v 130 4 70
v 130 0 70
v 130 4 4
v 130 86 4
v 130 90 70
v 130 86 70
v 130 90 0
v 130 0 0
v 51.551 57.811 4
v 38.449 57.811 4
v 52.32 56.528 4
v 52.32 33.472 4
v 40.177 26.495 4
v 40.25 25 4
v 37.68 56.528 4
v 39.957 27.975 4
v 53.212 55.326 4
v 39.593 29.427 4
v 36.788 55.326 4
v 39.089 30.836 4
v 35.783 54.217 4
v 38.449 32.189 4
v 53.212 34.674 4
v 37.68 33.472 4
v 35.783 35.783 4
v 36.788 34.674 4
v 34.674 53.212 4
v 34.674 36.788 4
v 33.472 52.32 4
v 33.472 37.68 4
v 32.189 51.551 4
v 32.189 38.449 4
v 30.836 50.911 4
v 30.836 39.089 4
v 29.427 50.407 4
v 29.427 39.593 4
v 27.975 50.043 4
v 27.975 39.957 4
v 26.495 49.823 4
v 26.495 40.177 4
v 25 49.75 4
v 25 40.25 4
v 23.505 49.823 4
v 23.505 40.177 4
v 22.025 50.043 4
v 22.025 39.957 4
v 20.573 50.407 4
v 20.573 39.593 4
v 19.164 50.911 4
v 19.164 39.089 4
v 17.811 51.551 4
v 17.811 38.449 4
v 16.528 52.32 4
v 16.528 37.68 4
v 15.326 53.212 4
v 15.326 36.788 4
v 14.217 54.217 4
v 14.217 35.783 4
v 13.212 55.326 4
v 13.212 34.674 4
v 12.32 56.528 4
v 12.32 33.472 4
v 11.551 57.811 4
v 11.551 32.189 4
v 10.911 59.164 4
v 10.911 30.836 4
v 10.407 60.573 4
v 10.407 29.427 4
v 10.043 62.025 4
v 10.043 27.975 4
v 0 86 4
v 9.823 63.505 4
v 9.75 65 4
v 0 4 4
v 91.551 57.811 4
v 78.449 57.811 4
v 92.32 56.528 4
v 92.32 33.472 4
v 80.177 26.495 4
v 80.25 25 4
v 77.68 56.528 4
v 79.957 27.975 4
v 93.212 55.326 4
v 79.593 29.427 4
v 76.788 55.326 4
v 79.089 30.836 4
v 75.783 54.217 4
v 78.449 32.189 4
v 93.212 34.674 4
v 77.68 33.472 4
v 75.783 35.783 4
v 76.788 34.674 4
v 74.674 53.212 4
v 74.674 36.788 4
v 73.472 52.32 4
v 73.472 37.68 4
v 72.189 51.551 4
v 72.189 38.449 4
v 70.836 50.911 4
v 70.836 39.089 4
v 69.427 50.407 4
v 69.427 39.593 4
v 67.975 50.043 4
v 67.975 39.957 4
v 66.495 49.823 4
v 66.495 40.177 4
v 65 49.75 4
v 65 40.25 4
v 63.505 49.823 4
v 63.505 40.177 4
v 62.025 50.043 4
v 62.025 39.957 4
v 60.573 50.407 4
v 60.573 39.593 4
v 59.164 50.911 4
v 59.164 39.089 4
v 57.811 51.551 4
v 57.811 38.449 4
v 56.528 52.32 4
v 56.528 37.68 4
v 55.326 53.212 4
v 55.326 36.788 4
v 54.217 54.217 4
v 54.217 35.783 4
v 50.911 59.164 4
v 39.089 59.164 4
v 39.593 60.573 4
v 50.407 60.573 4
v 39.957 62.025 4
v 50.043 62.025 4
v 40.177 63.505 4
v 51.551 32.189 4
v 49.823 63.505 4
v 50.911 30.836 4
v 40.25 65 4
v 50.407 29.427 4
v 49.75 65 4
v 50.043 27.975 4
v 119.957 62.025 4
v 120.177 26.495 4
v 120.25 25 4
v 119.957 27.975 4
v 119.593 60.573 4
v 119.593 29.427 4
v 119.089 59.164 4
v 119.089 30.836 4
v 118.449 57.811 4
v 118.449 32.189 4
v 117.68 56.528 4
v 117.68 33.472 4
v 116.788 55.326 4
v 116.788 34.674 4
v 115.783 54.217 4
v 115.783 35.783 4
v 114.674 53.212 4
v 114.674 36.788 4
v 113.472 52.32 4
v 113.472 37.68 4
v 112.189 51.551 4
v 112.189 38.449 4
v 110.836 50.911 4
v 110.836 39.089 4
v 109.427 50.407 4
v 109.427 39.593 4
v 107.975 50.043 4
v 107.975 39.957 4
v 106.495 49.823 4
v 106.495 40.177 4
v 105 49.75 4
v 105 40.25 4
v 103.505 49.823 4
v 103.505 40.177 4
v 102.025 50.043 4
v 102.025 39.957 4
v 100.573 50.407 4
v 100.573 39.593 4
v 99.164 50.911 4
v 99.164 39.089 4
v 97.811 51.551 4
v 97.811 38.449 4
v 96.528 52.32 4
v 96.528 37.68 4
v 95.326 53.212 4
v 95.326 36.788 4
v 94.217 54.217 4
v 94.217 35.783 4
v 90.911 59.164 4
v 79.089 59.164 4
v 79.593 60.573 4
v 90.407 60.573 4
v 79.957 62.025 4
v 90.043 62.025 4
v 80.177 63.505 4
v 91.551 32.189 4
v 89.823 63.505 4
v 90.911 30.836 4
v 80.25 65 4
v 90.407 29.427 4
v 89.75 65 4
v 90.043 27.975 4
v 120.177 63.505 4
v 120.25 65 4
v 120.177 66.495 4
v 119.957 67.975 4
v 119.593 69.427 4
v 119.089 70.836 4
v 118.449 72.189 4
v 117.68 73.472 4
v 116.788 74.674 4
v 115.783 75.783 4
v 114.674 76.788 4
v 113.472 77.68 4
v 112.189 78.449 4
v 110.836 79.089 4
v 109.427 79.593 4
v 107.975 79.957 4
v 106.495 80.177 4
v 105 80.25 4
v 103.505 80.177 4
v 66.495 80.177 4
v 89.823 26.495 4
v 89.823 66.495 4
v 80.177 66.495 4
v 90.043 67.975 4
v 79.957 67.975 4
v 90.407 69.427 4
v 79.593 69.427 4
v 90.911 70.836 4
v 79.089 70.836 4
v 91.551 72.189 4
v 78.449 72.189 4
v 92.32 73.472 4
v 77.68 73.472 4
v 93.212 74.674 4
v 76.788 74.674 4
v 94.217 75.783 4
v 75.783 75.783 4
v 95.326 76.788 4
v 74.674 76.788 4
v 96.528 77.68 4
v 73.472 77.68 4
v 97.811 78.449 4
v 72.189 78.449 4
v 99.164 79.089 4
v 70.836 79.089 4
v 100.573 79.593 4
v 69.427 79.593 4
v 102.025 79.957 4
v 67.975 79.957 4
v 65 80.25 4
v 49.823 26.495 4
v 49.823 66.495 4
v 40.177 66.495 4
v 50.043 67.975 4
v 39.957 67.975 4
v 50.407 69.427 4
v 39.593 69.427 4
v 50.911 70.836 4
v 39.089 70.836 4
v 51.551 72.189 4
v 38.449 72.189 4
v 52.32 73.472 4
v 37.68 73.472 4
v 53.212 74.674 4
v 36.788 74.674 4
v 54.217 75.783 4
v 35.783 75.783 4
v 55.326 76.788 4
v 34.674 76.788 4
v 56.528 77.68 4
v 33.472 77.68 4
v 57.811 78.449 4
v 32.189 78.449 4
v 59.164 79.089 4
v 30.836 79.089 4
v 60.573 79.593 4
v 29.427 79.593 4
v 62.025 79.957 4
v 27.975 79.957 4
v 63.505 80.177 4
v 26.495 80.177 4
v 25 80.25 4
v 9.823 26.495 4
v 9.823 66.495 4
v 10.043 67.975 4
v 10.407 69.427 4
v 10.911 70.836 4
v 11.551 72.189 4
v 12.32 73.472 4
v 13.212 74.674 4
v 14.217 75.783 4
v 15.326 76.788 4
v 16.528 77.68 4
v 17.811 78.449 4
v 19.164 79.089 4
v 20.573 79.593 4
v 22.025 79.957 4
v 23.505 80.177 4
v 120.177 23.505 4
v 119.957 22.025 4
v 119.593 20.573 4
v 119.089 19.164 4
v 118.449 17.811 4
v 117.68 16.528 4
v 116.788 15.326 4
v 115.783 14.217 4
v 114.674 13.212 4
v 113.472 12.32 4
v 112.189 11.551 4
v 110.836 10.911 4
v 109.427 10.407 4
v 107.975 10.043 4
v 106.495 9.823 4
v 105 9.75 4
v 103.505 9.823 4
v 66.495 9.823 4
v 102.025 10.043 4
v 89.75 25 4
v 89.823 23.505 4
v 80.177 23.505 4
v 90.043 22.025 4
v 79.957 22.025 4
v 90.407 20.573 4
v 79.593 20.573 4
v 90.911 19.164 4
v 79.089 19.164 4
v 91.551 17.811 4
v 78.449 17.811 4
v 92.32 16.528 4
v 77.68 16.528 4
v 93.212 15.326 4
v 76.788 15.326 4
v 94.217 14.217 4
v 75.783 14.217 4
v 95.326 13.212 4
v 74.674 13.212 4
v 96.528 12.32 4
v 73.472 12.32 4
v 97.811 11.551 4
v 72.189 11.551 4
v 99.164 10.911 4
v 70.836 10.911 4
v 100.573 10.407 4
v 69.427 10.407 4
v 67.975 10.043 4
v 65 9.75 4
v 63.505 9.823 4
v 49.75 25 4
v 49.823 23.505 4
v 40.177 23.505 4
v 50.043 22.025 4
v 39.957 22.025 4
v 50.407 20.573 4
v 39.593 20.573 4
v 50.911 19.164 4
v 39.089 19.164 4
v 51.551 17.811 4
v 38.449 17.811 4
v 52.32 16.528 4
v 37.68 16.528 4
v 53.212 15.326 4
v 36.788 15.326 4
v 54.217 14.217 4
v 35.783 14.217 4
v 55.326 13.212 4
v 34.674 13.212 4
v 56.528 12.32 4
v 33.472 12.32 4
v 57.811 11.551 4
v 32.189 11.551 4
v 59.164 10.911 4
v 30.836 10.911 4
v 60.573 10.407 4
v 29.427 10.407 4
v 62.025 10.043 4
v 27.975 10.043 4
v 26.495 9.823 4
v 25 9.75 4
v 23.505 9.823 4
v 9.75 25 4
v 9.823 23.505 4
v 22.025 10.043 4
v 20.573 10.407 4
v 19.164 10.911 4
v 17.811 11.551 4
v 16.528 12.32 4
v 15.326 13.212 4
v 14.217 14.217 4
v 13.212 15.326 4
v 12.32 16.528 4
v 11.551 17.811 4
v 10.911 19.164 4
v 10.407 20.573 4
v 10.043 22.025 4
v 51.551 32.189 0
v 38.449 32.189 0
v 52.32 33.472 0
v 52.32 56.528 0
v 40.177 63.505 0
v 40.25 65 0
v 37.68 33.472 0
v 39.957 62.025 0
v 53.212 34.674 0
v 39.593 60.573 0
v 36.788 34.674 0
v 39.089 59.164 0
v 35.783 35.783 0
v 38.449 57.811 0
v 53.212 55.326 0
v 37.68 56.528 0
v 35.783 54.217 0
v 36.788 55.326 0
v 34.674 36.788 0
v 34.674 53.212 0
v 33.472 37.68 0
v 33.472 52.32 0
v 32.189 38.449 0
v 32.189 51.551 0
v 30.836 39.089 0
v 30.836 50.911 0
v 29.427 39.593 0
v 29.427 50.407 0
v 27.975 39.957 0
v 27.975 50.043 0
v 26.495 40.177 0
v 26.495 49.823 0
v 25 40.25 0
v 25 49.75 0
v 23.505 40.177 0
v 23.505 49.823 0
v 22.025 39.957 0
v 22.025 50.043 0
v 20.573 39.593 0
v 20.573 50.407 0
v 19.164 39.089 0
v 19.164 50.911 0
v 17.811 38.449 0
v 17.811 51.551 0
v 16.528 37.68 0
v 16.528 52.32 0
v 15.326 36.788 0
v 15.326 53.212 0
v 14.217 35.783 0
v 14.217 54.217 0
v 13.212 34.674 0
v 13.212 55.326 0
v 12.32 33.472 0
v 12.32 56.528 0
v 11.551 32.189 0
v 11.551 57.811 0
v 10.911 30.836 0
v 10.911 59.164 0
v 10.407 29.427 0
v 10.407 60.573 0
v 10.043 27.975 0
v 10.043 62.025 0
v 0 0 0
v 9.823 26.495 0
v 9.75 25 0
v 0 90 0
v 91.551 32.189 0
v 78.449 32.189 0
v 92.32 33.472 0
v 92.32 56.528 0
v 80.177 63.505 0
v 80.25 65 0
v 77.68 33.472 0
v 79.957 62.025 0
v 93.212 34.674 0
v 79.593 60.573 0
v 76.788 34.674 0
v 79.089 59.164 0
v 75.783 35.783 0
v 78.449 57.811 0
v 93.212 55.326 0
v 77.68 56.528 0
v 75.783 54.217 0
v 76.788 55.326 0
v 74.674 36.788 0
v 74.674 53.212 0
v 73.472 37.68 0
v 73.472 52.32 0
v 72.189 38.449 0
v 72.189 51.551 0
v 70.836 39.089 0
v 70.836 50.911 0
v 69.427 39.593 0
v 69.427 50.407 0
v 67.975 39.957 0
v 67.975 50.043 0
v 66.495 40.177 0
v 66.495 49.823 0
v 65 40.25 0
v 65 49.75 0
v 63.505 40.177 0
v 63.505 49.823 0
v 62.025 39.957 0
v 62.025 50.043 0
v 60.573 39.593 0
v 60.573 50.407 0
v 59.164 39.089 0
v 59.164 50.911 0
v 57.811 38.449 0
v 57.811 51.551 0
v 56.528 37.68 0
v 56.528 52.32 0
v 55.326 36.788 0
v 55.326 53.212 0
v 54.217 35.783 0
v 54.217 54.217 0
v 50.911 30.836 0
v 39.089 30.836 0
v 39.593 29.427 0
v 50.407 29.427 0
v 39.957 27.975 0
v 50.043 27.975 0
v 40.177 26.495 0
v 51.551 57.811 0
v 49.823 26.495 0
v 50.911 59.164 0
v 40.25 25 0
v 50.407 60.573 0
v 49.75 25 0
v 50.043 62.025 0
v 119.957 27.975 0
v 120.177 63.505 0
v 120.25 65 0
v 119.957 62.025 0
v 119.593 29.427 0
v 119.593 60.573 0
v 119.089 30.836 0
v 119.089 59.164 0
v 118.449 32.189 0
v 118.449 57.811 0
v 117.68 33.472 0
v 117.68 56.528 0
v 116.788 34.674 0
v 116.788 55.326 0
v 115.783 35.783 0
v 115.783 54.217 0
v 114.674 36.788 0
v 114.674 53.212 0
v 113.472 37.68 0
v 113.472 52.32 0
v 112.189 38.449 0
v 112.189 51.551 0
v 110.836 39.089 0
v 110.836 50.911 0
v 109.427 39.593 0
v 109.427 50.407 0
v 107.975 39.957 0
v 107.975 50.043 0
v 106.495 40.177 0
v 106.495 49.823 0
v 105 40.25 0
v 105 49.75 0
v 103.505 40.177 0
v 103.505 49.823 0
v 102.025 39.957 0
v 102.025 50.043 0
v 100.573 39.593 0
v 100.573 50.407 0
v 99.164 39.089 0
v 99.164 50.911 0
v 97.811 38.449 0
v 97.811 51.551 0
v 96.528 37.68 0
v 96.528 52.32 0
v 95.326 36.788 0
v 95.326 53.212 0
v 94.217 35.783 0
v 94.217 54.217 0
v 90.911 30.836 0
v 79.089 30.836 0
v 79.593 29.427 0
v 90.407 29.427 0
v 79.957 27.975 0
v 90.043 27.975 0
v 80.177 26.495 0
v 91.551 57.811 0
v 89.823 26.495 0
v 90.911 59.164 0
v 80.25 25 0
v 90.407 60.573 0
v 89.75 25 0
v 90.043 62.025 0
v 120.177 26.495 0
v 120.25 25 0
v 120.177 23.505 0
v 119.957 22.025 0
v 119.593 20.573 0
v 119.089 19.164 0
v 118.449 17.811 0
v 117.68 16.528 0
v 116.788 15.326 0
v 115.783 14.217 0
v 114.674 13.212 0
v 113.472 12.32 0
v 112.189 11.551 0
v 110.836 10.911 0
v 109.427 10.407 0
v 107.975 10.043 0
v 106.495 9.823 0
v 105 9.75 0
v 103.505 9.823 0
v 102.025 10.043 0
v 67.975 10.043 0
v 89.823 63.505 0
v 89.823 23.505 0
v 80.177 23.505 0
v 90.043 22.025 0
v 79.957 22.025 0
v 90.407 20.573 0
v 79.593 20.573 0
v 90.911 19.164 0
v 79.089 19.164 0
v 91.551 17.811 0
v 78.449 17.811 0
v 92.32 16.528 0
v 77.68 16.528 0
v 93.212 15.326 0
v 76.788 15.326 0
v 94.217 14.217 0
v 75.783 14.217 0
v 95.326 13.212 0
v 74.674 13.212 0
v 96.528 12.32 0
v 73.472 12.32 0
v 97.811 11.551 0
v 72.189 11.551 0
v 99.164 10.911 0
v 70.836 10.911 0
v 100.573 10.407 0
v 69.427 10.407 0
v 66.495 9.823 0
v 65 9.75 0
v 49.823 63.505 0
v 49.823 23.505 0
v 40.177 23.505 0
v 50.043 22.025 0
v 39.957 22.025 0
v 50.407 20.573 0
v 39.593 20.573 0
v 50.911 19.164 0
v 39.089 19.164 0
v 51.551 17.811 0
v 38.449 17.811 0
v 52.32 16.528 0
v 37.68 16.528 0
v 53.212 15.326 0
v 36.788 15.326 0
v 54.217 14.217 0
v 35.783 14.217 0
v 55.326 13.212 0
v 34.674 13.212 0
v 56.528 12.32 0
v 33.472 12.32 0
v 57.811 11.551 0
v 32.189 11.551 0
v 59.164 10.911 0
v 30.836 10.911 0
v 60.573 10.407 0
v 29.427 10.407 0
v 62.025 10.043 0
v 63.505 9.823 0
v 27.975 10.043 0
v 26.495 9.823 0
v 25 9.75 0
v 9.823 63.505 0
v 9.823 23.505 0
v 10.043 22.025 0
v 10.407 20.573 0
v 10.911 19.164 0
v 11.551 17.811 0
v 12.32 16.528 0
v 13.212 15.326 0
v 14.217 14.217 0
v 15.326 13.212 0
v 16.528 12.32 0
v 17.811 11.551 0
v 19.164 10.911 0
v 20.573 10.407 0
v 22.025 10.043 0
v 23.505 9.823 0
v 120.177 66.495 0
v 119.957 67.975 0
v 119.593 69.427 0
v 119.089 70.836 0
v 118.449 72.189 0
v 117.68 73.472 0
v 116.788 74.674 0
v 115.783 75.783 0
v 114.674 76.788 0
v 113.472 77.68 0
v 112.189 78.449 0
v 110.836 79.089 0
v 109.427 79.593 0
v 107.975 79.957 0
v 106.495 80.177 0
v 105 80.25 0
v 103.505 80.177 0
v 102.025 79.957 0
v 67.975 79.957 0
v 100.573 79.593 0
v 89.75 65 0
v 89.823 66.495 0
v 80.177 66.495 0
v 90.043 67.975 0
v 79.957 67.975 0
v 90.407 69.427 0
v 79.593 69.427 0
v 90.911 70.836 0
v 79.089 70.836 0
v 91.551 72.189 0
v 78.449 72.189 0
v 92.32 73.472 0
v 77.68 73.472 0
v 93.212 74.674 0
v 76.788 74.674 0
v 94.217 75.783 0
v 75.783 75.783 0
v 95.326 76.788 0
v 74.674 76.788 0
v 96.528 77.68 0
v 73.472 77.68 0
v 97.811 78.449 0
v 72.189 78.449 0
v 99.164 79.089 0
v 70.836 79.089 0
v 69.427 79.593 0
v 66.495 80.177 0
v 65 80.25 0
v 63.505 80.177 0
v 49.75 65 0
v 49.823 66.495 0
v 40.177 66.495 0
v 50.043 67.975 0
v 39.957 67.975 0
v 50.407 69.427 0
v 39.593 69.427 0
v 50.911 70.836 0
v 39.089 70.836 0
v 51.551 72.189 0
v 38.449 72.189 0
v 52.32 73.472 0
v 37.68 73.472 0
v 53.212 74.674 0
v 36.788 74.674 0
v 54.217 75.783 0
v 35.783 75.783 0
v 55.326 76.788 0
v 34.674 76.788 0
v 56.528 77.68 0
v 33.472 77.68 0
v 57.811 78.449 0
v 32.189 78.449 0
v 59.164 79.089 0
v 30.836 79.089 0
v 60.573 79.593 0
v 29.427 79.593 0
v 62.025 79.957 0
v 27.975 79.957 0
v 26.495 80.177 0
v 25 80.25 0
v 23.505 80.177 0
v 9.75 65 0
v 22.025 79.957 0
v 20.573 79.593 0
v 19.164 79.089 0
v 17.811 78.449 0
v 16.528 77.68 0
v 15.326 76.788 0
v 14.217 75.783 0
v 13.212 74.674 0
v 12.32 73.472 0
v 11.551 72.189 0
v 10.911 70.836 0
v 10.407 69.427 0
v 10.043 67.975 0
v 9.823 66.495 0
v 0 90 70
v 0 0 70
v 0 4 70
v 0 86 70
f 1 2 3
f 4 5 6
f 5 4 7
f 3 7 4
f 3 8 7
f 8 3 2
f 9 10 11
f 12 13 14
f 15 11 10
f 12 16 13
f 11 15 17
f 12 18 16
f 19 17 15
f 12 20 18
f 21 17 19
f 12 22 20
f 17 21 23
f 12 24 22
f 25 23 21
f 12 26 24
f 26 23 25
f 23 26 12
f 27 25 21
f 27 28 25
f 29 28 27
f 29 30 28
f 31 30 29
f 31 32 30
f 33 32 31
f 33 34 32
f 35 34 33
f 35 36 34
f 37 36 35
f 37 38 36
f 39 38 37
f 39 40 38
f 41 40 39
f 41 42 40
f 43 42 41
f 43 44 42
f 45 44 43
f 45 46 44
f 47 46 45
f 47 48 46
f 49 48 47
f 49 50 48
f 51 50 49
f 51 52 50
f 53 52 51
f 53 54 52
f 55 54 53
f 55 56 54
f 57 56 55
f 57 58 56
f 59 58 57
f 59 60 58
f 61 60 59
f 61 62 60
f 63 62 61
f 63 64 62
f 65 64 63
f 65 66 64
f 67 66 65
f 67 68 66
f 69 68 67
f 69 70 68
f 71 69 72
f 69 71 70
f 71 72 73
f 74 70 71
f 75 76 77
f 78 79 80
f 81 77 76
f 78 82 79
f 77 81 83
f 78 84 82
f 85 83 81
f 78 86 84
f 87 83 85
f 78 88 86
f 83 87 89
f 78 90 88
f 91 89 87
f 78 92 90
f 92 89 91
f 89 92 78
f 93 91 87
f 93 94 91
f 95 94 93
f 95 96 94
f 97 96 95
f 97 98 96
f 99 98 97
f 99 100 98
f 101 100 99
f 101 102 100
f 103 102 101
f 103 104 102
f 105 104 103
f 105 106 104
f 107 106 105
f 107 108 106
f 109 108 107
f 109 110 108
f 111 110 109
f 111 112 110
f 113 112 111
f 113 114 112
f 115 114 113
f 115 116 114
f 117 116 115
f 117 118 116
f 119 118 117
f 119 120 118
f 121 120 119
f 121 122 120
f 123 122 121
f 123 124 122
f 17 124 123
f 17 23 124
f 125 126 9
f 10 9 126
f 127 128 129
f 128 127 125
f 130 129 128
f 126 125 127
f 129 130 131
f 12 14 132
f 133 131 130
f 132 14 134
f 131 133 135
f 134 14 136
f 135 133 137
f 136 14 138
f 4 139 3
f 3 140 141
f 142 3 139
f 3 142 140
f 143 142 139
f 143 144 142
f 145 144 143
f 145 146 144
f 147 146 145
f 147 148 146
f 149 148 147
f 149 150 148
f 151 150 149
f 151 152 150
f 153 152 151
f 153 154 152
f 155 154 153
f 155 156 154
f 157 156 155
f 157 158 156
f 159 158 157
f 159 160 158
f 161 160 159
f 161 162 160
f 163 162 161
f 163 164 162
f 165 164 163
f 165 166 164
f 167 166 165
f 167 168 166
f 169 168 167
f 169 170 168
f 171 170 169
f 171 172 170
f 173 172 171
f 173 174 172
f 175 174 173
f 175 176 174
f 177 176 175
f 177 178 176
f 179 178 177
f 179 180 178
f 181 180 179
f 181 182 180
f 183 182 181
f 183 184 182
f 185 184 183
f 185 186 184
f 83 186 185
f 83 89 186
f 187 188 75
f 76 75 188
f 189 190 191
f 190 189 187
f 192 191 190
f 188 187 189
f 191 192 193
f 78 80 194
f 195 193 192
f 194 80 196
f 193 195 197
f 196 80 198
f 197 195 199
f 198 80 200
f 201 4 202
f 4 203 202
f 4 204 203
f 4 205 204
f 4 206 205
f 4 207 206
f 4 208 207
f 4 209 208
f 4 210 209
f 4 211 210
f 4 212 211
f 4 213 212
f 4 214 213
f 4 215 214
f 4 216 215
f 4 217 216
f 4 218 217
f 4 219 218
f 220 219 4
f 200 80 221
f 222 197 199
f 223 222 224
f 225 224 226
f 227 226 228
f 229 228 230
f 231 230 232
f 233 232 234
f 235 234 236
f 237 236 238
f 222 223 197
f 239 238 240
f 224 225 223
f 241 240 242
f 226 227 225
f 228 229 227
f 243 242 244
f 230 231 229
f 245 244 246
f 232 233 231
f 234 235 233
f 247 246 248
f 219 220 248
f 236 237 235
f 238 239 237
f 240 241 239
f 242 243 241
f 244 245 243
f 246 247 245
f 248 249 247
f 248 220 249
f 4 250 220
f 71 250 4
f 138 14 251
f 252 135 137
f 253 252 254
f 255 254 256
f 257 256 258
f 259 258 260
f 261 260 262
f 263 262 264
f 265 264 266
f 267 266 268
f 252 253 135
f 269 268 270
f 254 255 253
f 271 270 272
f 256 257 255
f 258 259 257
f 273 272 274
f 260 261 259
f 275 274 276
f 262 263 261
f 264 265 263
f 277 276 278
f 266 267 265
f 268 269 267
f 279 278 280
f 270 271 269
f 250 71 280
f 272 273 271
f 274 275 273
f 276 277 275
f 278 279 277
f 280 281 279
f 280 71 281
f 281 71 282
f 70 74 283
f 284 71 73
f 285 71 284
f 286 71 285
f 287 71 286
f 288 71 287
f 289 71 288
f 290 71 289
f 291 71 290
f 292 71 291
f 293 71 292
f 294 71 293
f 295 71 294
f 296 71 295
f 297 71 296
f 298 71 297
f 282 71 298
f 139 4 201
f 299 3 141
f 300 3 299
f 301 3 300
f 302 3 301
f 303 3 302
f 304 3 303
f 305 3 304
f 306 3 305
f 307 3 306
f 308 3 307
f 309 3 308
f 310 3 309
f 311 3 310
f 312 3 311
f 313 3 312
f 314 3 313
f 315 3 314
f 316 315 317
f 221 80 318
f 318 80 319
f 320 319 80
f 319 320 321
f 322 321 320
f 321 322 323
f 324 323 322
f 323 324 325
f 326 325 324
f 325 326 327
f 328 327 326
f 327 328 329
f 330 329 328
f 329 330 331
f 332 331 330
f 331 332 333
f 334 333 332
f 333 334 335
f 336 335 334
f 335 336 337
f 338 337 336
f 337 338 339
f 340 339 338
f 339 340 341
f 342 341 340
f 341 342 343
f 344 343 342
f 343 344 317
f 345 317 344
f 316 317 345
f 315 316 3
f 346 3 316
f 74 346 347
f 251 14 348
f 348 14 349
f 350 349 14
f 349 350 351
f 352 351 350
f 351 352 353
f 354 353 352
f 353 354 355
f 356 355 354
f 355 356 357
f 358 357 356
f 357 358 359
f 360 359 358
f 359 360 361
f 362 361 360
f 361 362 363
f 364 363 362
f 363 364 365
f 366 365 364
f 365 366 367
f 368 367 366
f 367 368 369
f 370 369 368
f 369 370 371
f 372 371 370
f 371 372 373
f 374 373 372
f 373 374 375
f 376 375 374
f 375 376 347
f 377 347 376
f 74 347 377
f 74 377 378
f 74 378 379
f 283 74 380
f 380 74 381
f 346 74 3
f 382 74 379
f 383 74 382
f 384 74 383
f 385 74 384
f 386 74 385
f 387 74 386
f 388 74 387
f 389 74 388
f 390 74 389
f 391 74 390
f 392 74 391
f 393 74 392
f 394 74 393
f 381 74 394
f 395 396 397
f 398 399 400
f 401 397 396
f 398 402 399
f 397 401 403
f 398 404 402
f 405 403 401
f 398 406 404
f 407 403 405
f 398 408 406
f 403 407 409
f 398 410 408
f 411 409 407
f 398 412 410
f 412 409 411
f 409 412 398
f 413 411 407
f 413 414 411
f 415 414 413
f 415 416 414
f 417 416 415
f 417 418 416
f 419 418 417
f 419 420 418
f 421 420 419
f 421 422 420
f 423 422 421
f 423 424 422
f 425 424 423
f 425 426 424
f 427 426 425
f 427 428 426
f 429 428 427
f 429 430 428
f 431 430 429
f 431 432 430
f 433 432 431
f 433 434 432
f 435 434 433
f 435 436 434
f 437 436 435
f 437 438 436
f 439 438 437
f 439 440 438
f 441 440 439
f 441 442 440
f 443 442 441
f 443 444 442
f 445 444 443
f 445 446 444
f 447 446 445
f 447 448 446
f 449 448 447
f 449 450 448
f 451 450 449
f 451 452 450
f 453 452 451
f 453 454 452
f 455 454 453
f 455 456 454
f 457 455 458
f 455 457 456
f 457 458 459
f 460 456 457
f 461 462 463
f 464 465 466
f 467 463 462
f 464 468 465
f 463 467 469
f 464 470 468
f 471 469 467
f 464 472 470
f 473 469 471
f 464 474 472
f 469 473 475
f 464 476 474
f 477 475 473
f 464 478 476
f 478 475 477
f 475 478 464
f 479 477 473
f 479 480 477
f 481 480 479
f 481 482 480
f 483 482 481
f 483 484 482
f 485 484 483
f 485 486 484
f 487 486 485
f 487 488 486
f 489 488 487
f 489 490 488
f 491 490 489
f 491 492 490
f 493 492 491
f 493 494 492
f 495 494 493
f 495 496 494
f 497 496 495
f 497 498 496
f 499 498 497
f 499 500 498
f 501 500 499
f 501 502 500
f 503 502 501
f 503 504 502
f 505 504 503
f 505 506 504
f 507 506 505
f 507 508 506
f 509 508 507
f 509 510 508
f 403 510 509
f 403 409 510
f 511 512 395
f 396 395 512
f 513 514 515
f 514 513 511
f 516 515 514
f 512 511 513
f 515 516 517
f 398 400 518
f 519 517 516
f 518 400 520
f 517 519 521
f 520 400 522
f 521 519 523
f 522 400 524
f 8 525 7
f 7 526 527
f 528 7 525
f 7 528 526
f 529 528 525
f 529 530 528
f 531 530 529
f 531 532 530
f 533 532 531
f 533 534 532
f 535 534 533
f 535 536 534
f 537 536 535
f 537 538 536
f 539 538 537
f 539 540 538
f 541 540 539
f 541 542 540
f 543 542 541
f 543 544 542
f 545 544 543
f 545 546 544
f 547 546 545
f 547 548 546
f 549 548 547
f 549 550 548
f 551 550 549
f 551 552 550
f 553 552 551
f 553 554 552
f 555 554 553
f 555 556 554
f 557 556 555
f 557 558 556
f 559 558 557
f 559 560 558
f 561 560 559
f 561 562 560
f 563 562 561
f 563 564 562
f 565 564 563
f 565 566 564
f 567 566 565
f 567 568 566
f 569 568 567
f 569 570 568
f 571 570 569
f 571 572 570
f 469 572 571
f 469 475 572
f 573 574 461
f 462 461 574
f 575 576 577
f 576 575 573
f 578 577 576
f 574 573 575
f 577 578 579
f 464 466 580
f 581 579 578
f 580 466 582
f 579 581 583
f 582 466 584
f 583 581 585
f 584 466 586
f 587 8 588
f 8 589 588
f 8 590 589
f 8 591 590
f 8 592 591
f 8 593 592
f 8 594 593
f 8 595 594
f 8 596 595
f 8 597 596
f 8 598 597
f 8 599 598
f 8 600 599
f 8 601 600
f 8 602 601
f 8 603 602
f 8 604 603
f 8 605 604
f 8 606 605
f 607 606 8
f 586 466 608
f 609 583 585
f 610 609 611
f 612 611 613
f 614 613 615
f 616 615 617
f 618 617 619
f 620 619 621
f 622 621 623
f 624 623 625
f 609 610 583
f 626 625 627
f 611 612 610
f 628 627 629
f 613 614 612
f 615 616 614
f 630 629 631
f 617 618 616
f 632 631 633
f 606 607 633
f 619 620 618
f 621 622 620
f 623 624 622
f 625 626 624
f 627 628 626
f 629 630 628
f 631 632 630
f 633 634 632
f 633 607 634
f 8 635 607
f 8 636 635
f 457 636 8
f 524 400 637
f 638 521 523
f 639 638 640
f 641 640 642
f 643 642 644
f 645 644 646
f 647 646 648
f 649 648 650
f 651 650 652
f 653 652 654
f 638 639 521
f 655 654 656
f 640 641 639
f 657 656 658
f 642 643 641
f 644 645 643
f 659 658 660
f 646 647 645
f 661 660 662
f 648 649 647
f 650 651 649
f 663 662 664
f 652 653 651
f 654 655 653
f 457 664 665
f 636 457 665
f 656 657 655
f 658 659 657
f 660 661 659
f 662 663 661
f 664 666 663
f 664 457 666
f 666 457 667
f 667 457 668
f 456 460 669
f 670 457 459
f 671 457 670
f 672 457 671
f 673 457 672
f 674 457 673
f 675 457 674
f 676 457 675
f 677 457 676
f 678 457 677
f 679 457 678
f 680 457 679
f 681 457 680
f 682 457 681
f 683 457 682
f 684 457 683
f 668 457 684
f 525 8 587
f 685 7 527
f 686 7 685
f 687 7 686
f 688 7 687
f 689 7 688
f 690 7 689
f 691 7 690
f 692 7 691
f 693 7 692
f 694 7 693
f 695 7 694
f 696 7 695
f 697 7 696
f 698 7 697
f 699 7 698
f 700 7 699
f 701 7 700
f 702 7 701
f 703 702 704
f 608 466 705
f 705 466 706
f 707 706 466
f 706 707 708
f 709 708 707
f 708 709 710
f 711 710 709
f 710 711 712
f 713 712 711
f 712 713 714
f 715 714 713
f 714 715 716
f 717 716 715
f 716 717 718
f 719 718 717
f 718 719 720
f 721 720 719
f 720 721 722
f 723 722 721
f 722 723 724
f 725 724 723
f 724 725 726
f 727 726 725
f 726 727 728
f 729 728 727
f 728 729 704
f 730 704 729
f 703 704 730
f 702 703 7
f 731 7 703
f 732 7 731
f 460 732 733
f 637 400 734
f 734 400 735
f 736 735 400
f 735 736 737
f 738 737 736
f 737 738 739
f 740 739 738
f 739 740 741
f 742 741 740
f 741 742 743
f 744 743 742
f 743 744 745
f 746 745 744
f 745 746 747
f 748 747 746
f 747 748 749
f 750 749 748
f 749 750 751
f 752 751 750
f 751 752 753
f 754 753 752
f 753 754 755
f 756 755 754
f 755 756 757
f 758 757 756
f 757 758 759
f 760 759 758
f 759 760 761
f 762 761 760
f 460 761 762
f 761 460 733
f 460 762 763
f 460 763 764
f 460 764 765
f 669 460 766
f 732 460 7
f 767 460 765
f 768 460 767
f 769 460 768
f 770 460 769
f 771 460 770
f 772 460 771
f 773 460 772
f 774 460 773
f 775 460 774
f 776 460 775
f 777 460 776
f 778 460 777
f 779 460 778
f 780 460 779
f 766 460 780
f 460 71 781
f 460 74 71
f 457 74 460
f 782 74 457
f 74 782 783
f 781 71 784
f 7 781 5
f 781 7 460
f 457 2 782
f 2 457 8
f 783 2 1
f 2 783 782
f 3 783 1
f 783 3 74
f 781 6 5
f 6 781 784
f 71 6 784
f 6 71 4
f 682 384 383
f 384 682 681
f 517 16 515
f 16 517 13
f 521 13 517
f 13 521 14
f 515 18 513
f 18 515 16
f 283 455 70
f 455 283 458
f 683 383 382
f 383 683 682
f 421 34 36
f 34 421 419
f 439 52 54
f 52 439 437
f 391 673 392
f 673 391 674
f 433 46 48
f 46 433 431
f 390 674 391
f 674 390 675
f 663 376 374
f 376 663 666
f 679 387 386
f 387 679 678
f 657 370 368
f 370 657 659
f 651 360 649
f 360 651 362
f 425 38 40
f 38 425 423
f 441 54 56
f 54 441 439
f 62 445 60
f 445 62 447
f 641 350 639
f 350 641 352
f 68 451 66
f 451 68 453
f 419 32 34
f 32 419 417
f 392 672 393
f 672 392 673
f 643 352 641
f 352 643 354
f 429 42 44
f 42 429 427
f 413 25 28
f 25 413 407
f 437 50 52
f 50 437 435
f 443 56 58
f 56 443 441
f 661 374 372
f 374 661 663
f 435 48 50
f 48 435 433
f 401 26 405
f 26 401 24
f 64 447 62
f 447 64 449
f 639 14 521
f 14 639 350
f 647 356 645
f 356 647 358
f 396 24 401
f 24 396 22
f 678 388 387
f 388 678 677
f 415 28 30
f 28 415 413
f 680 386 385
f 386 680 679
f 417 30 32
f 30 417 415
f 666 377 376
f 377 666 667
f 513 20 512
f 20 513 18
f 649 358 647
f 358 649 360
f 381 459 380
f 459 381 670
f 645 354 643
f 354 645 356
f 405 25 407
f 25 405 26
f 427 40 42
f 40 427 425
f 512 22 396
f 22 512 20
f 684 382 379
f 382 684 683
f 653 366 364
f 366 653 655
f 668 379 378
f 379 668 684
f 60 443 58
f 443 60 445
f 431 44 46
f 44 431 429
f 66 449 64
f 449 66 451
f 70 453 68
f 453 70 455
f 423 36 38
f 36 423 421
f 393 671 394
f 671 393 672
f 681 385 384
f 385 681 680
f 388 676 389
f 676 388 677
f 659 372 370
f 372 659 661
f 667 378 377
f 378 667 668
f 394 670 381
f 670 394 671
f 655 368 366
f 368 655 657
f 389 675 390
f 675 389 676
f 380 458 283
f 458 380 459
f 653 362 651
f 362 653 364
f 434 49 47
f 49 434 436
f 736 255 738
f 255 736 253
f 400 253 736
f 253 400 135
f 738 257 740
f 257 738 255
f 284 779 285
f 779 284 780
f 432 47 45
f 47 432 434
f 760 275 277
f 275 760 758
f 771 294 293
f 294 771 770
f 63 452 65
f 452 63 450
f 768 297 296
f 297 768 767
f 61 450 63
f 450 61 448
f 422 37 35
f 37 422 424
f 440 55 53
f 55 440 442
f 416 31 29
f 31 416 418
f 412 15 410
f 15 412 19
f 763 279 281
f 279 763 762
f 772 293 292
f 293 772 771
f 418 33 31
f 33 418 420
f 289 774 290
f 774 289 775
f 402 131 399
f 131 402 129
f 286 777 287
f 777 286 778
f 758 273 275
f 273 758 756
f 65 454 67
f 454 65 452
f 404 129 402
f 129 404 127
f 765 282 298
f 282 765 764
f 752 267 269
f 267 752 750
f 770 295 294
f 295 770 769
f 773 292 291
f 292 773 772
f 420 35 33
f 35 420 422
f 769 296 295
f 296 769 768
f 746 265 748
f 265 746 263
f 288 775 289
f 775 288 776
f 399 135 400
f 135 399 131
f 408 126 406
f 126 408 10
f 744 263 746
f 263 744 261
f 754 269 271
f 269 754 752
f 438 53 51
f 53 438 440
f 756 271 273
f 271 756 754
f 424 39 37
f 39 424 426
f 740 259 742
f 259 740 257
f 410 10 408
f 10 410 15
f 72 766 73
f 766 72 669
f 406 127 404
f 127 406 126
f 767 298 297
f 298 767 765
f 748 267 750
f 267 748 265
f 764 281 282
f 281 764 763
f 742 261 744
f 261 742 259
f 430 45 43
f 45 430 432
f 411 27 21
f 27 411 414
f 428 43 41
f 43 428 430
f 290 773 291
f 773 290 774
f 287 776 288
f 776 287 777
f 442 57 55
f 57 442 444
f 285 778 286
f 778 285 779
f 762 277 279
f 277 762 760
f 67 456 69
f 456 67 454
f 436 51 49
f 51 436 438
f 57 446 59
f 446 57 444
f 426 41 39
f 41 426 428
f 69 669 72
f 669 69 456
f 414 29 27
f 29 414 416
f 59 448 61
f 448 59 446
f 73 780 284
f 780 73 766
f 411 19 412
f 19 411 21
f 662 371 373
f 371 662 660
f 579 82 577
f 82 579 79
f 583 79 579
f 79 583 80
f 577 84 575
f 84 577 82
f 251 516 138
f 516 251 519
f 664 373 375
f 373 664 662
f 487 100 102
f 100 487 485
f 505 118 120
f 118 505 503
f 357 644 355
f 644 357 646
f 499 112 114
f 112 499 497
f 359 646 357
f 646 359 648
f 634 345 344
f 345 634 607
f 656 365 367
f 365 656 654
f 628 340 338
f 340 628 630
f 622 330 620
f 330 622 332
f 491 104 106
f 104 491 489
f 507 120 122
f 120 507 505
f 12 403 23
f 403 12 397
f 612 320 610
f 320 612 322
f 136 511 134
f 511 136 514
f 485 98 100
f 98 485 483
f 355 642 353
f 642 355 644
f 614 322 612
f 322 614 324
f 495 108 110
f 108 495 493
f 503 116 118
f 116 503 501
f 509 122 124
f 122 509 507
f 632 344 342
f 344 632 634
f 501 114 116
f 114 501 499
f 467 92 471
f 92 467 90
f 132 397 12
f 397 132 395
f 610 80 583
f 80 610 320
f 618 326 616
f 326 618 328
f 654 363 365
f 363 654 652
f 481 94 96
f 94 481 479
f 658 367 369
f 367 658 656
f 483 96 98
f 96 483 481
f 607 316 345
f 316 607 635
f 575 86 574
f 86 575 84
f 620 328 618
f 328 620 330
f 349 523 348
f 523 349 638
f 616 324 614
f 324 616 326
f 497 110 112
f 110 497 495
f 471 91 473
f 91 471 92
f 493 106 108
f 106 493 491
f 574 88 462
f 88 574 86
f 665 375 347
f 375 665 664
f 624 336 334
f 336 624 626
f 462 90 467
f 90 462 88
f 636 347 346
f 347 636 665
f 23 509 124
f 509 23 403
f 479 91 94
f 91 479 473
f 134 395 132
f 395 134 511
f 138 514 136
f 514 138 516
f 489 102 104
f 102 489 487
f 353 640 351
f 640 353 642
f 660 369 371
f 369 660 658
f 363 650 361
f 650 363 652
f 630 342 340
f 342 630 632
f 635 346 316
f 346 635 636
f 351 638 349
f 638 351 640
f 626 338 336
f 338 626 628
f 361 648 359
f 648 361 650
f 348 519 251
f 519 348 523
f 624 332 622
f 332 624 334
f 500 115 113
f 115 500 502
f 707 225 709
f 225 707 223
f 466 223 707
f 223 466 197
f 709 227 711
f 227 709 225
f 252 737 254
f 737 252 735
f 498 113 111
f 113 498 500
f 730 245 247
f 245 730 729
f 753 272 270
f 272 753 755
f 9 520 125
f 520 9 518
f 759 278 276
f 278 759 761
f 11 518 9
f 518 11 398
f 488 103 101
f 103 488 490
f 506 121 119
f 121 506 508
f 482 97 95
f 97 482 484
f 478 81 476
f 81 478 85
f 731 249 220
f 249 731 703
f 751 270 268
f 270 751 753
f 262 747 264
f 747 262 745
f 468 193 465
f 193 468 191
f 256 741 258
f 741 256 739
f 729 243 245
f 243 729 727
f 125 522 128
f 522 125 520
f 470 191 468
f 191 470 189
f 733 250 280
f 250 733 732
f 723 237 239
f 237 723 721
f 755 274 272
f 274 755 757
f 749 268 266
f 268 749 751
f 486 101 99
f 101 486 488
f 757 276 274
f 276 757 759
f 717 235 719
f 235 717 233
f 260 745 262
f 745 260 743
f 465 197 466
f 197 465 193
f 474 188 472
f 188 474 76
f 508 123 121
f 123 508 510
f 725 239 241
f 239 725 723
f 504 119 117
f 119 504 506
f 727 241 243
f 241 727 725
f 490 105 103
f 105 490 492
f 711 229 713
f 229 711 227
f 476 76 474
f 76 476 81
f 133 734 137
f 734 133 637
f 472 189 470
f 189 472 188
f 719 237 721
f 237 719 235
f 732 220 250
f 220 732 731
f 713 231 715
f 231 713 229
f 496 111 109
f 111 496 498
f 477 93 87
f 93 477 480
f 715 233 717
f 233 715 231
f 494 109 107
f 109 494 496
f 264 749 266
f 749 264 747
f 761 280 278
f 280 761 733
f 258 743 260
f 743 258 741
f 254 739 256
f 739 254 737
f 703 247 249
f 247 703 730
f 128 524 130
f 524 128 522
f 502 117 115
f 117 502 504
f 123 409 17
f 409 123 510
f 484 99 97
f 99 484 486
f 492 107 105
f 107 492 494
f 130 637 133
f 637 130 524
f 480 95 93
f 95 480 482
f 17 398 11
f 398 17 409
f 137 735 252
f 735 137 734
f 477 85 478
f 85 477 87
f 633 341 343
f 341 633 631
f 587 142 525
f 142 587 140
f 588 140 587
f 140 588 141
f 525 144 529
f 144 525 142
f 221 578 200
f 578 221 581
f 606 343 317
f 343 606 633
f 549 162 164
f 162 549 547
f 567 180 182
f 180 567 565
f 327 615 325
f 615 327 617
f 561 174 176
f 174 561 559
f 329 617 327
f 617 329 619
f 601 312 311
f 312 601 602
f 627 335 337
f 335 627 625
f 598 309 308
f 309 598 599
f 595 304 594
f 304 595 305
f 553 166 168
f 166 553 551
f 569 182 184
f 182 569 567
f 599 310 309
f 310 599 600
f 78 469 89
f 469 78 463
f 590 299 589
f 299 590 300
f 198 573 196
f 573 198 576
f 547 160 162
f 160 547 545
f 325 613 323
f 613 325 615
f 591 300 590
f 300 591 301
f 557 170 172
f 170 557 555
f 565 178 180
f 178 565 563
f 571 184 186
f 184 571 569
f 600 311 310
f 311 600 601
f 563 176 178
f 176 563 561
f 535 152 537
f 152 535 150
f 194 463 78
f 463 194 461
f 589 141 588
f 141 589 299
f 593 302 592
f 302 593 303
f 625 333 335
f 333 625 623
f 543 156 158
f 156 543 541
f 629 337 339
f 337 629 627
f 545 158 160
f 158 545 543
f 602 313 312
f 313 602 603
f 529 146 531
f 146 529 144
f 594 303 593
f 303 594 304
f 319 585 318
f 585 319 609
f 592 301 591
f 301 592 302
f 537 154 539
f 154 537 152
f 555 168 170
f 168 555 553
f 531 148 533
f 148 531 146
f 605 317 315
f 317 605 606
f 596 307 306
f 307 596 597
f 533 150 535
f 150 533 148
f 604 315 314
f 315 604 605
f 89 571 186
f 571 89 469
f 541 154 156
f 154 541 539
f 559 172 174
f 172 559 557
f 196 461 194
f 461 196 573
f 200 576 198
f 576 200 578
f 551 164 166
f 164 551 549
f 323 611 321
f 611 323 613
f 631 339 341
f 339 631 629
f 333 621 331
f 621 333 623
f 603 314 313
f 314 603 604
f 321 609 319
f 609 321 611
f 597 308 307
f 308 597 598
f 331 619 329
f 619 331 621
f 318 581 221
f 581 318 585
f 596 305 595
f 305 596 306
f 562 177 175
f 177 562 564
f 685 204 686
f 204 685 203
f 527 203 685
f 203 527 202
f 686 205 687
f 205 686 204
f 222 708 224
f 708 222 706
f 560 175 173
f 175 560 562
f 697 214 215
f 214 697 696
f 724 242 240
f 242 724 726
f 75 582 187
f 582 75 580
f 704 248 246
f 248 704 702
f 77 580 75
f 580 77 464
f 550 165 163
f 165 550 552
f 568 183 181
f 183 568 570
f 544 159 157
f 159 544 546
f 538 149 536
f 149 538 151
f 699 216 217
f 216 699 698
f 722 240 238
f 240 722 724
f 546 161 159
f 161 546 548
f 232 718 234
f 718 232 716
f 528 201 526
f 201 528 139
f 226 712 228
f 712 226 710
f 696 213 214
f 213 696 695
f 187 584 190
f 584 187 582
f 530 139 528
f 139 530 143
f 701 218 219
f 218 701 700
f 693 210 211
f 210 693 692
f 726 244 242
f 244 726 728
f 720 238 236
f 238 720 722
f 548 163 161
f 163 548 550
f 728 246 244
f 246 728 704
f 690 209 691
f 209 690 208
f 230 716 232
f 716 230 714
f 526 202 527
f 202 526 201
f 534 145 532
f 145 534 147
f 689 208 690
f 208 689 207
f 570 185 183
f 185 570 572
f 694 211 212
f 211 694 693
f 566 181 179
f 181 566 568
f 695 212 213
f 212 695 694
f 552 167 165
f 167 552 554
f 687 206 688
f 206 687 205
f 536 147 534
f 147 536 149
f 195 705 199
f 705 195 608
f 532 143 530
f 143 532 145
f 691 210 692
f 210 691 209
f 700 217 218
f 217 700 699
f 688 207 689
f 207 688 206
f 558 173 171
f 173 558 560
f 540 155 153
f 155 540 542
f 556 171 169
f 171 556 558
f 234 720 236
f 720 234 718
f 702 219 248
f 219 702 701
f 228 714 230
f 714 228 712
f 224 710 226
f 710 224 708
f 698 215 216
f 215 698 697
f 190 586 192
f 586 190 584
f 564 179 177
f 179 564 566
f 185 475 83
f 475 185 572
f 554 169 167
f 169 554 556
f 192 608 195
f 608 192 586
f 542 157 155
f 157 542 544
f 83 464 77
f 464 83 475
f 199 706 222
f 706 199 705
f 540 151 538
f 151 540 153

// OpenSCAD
$fn = 64;

// Dimensions in millimetres
plate_width_X = 130;
plate_width_Y = 90;
plate_thickness = 4;
wall_height_total = 70;
wall_thickness = 4;
wall_length = 130;
hole_diameter = 30.5;
hole_count_X = 3;
hole_count_Y = 2;
hole_spacing = 40;

// Calculated positions
center_X = plate_width_X / 2;
center_Y = plate_width_Y / 2;
hole_x_offset = (plate_width_X - (hole_count_X - 1) * hole_spacing) / 2;
hole_y_offset = (plate_width_Y - (hole_count_Y - 1) * hole_spacing) / 2;
wall_height_above_plate = wall_height_total - plate_thickness;
wall_z_start = plate_thickness;
wall_z_end = wall_height_total;

// Main module
module rack() {
    difference() {
        // Base structure: Plate + Walls
        union() {
            // Plate
            translate([0, 0, 0])
                cube([plate_width_X, plate_width_Y, plate_thickness]);

            // Wall 1 (Left edge, Y = 0)
            // Positioned at Y = 0 to wall_thickness
            translate([0, 0, 0])
                cube([wall_length, wall_thickness, wall_height_total]);

            // Wall 2 (Right edge, Y = plate_width_Y - wall_thickness)
            // Positioned at Y = plate_width_Y - wall_thickness to plate_width_Y
            translate([0, plate_width_Y - wall_thickness, 0])
                cube([wall_length, wall_thickness, wall_height_total]);
        }

        // Holes (Through plate only, Z = 0 to plate_thickness + 0.1)
        // Extend slightly past plate thickness to ensure clean cut
        for (i = [0 : hole_count_X - 1]) {
            for (j = [0 : hole_count_Y - 1]) {
                translate([
                    hole_x_offset + i * hole_spacing,
                    hole_y_offset + j * hole_spacing,
                    0
                ])
                    cylinder(
                        h = plate_thickness + 0.1,
                        r = hole_diameter / 2,
                        center = [0, 0, 0]
                    );
            }
        }
    }
}

// Center the part on the origin
translate([0, 0, 0])
    rack();
